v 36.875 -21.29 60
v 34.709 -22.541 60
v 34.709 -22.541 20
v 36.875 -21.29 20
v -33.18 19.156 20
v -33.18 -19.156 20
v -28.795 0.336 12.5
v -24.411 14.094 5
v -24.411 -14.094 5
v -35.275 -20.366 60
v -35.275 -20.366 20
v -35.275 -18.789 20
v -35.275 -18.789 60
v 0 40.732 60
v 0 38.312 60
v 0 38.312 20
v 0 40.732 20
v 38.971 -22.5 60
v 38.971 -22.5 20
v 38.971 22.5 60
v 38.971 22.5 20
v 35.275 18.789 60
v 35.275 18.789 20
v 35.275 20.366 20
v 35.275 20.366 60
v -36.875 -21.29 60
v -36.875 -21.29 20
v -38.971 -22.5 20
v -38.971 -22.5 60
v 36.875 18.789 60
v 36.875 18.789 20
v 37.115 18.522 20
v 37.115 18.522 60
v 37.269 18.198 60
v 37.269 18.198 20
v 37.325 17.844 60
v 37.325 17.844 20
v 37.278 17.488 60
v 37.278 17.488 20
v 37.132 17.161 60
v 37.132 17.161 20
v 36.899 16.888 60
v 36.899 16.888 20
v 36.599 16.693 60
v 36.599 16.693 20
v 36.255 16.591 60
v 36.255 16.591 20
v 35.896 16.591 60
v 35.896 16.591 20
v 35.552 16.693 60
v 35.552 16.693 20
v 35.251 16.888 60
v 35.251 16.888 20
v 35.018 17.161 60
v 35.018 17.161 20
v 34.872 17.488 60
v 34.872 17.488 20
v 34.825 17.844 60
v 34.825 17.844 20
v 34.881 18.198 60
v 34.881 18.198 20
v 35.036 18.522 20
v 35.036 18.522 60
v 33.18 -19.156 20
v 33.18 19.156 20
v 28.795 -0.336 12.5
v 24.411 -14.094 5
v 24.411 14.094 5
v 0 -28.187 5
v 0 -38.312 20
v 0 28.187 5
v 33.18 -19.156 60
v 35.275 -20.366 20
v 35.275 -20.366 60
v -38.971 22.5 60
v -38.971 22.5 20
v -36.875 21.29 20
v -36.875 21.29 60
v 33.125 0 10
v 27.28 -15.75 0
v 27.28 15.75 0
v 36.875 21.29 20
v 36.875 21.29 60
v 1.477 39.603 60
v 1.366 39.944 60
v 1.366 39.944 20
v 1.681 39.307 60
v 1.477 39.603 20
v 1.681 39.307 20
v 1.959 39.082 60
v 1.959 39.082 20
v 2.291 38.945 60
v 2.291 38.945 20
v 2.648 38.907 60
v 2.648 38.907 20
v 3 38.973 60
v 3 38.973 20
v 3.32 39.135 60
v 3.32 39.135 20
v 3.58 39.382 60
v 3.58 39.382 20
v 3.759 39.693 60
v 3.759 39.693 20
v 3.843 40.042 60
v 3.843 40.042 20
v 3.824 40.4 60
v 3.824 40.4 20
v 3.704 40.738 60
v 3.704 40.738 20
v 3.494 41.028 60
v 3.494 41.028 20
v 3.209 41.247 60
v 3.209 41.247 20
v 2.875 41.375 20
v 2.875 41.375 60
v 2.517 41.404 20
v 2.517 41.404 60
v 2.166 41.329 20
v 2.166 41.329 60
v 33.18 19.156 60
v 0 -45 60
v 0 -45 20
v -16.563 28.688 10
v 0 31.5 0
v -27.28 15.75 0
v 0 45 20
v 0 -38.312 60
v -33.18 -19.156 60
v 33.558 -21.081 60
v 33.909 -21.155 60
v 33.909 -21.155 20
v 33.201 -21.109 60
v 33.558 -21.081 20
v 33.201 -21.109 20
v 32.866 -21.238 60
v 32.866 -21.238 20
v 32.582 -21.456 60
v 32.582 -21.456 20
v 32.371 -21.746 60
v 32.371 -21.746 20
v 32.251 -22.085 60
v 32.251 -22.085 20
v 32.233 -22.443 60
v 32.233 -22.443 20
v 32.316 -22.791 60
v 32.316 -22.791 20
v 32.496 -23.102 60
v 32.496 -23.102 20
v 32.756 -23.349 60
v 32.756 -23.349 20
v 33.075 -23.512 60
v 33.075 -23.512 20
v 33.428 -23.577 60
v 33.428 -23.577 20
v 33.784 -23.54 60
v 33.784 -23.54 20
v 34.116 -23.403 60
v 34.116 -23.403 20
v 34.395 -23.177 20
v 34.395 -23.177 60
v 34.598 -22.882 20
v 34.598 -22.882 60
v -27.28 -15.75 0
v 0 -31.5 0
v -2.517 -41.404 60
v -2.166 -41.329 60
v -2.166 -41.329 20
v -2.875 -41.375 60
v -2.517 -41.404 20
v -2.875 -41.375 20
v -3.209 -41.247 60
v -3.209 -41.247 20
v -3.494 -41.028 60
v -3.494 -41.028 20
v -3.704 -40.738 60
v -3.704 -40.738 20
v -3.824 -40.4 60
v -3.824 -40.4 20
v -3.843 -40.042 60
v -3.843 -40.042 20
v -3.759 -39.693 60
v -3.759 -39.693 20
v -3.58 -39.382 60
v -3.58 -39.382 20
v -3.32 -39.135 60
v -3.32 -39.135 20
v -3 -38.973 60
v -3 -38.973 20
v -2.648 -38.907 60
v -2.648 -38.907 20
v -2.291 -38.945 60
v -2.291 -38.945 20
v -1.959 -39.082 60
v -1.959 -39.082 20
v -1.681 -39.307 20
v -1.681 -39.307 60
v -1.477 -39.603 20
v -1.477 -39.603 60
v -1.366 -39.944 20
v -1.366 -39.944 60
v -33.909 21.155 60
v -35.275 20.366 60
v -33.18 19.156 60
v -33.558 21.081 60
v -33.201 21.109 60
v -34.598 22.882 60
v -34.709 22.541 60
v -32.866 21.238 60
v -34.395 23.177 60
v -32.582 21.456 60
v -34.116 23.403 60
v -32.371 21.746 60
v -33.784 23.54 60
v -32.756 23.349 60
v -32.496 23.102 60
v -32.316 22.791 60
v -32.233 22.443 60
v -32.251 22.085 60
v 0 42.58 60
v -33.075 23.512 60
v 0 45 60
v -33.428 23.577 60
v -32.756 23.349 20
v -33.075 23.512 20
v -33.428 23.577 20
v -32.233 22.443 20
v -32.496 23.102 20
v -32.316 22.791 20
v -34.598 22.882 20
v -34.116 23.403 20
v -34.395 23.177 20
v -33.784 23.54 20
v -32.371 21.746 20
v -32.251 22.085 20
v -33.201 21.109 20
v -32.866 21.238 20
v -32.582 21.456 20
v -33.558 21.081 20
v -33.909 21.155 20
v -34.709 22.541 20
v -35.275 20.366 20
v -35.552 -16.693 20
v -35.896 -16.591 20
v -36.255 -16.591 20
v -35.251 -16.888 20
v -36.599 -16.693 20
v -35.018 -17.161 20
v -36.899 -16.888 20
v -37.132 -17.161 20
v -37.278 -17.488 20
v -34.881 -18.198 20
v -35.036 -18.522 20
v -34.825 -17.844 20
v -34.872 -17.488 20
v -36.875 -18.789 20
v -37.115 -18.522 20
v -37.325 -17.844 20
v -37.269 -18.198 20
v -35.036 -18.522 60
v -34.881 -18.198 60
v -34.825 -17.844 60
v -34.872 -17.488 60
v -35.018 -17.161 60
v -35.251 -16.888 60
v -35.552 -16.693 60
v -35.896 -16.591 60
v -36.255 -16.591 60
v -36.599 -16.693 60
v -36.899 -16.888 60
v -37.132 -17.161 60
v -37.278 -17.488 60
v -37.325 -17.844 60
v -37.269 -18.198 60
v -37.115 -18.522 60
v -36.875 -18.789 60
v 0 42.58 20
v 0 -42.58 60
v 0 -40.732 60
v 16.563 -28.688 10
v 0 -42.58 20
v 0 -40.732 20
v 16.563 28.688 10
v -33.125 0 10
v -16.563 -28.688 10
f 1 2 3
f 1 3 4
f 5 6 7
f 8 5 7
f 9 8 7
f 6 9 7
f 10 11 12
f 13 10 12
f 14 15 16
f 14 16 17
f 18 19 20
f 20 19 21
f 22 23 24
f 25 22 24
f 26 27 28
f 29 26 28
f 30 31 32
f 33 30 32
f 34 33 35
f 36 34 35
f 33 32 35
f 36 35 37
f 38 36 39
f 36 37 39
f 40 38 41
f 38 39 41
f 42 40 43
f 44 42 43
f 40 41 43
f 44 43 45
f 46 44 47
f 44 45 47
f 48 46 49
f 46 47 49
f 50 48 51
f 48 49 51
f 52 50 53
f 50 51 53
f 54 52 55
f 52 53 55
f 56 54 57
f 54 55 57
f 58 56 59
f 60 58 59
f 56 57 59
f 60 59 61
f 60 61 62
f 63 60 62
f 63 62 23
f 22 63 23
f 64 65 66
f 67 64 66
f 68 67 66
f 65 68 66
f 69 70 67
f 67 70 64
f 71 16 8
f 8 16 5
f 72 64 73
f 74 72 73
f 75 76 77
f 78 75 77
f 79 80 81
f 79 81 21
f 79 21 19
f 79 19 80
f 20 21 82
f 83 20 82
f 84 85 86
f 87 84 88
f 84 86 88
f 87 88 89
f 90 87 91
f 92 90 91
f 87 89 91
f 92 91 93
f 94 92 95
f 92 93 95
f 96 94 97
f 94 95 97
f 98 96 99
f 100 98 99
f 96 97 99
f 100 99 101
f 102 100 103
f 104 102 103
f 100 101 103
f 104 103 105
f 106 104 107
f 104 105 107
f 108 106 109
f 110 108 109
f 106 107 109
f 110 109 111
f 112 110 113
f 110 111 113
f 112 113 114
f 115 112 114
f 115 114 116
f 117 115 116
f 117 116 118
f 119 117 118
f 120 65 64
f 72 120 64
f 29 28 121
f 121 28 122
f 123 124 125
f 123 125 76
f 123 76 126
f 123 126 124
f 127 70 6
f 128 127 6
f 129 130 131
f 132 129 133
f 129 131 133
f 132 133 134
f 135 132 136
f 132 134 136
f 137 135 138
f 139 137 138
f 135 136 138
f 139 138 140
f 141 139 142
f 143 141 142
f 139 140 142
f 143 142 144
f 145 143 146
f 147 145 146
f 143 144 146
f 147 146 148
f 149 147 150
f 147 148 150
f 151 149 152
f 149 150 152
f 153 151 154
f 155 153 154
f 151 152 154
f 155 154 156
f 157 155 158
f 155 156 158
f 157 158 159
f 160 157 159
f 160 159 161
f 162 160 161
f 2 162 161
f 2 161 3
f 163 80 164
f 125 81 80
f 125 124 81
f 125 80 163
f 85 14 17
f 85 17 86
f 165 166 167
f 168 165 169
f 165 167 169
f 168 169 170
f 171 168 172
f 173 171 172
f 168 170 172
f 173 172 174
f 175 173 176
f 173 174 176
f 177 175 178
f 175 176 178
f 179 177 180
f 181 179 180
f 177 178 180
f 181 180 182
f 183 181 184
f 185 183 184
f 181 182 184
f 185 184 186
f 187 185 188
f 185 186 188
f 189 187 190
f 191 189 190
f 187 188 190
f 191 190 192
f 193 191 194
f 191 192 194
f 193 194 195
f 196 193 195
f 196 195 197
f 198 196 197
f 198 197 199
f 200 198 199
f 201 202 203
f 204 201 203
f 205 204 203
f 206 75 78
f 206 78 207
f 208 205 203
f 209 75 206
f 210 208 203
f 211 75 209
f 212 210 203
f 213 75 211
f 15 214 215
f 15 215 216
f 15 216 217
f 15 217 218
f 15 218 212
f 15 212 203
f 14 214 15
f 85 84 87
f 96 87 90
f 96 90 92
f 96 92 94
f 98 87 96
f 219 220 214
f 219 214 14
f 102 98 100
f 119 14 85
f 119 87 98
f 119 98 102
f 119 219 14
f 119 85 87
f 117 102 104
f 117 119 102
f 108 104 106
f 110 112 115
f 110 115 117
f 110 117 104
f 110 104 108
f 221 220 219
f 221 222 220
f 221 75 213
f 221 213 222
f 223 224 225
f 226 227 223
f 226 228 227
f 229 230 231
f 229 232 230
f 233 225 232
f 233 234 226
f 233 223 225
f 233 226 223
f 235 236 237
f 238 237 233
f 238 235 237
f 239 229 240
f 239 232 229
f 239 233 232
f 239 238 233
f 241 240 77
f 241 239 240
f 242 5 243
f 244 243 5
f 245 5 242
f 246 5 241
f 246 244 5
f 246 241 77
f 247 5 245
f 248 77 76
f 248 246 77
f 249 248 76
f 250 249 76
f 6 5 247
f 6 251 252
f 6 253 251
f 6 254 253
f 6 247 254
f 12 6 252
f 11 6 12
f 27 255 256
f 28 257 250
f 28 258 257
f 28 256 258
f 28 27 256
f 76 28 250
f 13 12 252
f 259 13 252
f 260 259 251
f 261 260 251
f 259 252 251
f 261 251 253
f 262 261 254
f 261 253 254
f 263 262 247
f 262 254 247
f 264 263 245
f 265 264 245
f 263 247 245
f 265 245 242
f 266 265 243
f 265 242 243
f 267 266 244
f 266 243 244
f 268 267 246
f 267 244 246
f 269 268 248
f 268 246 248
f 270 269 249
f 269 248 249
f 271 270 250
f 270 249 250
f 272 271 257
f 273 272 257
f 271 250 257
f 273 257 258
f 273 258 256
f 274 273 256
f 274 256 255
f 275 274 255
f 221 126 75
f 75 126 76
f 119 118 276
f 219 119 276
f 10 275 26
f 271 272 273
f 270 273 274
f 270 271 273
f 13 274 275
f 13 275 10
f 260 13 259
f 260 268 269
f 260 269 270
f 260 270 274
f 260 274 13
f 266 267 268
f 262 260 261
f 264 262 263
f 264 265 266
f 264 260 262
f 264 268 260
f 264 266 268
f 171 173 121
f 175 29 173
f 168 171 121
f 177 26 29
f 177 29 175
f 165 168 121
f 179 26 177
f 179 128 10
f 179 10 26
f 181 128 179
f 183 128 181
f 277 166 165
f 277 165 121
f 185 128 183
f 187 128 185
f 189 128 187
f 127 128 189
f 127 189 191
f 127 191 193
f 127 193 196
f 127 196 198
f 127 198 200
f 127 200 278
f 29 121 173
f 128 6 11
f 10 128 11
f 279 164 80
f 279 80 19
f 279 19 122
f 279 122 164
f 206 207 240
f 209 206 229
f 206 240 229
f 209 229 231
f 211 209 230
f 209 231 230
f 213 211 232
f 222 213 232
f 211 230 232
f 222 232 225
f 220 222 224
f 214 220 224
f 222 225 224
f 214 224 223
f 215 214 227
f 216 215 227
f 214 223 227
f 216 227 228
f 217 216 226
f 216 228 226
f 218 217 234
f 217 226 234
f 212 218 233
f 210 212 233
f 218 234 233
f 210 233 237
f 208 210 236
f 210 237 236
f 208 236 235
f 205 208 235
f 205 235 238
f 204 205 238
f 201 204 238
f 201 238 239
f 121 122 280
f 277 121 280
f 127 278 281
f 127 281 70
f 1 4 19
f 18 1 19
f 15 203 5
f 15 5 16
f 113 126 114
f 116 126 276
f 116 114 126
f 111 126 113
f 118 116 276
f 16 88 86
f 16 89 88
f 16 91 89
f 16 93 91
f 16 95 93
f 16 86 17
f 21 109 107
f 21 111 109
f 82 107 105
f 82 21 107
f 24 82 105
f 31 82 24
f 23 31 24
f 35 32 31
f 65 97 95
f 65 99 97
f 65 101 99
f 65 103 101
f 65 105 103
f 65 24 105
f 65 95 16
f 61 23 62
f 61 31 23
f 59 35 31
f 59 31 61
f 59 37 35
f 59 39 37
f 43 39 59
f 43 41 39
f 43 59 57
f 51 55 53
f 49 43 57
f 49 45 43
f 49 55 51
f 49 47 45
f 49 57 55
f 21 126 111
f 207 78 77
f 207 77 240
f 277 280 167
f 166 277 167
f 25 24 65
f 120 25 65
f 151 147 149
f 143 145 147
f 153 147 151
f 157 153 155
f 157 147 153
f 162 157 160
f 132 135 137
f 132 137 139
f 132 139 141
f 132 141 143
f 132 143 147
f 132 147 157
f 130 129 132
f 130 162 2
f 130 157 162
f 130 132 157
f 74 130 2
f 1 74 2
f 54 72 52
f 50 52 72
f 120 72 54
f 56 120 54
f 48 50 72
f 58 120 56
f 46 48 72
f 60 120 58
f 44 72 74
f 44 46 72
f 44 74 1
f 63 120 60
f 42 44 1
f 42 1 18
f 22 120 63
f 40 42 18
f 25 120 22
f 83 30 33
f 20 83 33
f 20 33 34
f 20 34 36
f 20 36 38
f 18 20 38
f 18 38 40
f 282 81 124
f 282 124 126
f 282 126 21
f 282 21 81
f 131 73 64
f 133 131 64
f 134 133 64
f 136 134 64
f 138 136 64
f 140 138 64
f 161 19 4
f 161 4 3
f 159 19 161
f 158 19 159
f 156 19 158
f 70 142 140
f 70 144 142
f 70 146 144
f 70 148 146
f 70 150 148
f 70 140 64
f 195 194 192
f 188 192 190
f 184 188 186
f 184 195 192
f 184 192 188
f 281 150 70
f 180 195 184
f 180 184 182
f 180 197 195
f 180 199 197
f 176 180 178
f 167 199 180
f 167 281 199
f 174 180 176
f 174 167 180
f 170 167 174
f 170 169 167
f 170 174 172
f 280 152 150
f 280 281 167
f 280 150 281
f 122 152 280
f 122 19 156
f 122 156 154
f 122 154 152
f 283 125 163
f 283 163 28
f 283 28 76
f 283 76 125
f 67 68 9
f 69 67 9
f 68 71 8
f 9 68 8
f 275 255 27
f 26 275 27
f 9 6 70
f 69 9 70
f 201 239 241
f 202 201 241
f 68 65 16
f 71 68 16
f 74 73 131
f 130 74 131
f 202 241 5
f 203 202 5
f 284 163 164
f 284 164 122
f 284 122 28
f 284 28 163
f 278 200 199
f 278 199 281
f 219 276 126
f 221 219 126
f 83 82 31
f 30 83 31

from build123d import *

# Parameters (mm, degrees)
F5_T     = -5
F7_DEPTH = 40


with BuildPart() as f4:
    # F0 (on Top) → F4 section 0
    with BuildSketch(Plane.XY):
        Polygon((27.2798002192, 15.75), (0, 31.5), (-27.2798002192, 15.75), (-27.2798002192, -15.75), (0, -31.5), (27.2798002192, -15.75), align=None)
    # F2 (on offset) → F4 section 1
    with BuildSketch(Plane.XY.offset(20)):
        Polygon((-38.9711431703, -22.5), (0, -45), (38.9711431703, -22.5), (38.9711431703, 22.5), (0, 45), (-38.9711431703, 22.5), align=None)
    loft()

    # F5
    f5_openings = [f4.faces().sort_by_distance(p)[0] for p in [
        (0, 0, 20),
    ]]
    offset(amount=F5_T, openings=f5_openings)

    # F6 (on face) → F7 (join)
    with BuildSketch(Plane.XY.offset(20)):
        with BuildLine():
            Line((0, -38.3124026487), (-33.1795139738, -19.1562013243))
            Line((-33.1795139738, -19.1562013243), (-35.275328572, -20.3662204468))
            Line((-35.275328572, -20.3662204468), (-35.275328572, -18.7885692978))
            ThreePointArc((-35.275328572, -18.7885692978), (-36.075328572, -16.5781006622), (-36.875328572, -18.7885692978))
            Line((-36.875328572, -18.7885692978), (-36.875328572, -21.2899808775))
            Line((-36.875328572, -21.2899808775), (-38.9711431703, -22.5))
            Line((-38.9711431703, -22.5), (0, -45))
            Line((0, -45), (0, -42.579961755))
            Line((0, -42.579961755), (-2.1662859734, -41.3292559652))
            ThreePointArc((-2.1662859734, -41.3292559652), (-3.6806079661, -39.5312013243), (-1.3662859734, -39.9436153191))
            Line((-1.3662859734, -39.9436153191), (0, -40.7324408936))
            Line((0, -40.7324408936), (0, -38.3124026487))
        make_face()
        with BuildLine():
            Line((-35.275328572, 20.3662204468), (-33.1795139738, 19.1562013243))
            Line((-33.1795139738, 19.1562013243), (0, 38.3124026487))
            Line((0, 38.3124026487), (0, 40.7324408936))
            Line((0, 40.7324408936), (1.3662859734, 39.9436153191))
            ThreePointArc((1.3662859734, 39.9436153191), (3.6806079661, 39.5312013243), (2.1662859734, 41.3292559652))
            Line((2.1662859734, 41.3292559652), (0, 42.579961755))
            Line((0, 42.579961755), (0, 45))
            Line((0, 45), (-38.9711431703, 22.5))
            Line((-38.9711431703, 22.5), (-36.875328572, 21.2899808775))
            Line((-36.875328572, 21.2899808775), (-34.7090425987, 22.5406866674))
            ThreePointArc((-34.7090425987, 22.5406866674), (-32.394720606, 22.9531006622), (-33.9090425987, 21.1550460213))
            Line((-33.9090425987, 21.1550460213), (-35.275328572, 20.3662204468))
        make_face()
        with BuildLine():
            Line((33.1795139738, 19.1562013243), (33.1795139738, -19.1562013243))
            Line((33.1795139738, -19.1562013243), (35.275328572, -20.3662204468))
            Line((35.275328572, -20.3662204468), (33.9090425987, -21.1550460213))
            ThreePointArc((33.9090425987, -21.1550460213), (32.394720606, -22.9531006622), (34.7090425987, -22.5406866674))
            Line((34.7090425987, -22.5406866674), (36.875328572, -21.2899808775))
            Line((36.875328572, -21.2899808775), (38.9711431703, -22.5))
            Line((38.9711431703, -22.5), (38.9711431703, 22.5))
            Line((38.9711431703, 22.5), (36.875328572, 21.2899808775))
            Line((36.875328572, 21.2899808775), (36.875328572, 18.7885692978))
            ThreePointArc((36.875328572, 18.7885692978), (36.075328572, 16.5781006622), (35.275328572, 18.7885692978))
            Line((35.275328572, 18.7885692978), (35.275328572, 20.3662204468))
            Line((35.275328572, 20.3662204468), (33.1795139738, 19.1562013243))
        make_face()
    extrude(amount=F7_DEPTH)


solid = f4.part
